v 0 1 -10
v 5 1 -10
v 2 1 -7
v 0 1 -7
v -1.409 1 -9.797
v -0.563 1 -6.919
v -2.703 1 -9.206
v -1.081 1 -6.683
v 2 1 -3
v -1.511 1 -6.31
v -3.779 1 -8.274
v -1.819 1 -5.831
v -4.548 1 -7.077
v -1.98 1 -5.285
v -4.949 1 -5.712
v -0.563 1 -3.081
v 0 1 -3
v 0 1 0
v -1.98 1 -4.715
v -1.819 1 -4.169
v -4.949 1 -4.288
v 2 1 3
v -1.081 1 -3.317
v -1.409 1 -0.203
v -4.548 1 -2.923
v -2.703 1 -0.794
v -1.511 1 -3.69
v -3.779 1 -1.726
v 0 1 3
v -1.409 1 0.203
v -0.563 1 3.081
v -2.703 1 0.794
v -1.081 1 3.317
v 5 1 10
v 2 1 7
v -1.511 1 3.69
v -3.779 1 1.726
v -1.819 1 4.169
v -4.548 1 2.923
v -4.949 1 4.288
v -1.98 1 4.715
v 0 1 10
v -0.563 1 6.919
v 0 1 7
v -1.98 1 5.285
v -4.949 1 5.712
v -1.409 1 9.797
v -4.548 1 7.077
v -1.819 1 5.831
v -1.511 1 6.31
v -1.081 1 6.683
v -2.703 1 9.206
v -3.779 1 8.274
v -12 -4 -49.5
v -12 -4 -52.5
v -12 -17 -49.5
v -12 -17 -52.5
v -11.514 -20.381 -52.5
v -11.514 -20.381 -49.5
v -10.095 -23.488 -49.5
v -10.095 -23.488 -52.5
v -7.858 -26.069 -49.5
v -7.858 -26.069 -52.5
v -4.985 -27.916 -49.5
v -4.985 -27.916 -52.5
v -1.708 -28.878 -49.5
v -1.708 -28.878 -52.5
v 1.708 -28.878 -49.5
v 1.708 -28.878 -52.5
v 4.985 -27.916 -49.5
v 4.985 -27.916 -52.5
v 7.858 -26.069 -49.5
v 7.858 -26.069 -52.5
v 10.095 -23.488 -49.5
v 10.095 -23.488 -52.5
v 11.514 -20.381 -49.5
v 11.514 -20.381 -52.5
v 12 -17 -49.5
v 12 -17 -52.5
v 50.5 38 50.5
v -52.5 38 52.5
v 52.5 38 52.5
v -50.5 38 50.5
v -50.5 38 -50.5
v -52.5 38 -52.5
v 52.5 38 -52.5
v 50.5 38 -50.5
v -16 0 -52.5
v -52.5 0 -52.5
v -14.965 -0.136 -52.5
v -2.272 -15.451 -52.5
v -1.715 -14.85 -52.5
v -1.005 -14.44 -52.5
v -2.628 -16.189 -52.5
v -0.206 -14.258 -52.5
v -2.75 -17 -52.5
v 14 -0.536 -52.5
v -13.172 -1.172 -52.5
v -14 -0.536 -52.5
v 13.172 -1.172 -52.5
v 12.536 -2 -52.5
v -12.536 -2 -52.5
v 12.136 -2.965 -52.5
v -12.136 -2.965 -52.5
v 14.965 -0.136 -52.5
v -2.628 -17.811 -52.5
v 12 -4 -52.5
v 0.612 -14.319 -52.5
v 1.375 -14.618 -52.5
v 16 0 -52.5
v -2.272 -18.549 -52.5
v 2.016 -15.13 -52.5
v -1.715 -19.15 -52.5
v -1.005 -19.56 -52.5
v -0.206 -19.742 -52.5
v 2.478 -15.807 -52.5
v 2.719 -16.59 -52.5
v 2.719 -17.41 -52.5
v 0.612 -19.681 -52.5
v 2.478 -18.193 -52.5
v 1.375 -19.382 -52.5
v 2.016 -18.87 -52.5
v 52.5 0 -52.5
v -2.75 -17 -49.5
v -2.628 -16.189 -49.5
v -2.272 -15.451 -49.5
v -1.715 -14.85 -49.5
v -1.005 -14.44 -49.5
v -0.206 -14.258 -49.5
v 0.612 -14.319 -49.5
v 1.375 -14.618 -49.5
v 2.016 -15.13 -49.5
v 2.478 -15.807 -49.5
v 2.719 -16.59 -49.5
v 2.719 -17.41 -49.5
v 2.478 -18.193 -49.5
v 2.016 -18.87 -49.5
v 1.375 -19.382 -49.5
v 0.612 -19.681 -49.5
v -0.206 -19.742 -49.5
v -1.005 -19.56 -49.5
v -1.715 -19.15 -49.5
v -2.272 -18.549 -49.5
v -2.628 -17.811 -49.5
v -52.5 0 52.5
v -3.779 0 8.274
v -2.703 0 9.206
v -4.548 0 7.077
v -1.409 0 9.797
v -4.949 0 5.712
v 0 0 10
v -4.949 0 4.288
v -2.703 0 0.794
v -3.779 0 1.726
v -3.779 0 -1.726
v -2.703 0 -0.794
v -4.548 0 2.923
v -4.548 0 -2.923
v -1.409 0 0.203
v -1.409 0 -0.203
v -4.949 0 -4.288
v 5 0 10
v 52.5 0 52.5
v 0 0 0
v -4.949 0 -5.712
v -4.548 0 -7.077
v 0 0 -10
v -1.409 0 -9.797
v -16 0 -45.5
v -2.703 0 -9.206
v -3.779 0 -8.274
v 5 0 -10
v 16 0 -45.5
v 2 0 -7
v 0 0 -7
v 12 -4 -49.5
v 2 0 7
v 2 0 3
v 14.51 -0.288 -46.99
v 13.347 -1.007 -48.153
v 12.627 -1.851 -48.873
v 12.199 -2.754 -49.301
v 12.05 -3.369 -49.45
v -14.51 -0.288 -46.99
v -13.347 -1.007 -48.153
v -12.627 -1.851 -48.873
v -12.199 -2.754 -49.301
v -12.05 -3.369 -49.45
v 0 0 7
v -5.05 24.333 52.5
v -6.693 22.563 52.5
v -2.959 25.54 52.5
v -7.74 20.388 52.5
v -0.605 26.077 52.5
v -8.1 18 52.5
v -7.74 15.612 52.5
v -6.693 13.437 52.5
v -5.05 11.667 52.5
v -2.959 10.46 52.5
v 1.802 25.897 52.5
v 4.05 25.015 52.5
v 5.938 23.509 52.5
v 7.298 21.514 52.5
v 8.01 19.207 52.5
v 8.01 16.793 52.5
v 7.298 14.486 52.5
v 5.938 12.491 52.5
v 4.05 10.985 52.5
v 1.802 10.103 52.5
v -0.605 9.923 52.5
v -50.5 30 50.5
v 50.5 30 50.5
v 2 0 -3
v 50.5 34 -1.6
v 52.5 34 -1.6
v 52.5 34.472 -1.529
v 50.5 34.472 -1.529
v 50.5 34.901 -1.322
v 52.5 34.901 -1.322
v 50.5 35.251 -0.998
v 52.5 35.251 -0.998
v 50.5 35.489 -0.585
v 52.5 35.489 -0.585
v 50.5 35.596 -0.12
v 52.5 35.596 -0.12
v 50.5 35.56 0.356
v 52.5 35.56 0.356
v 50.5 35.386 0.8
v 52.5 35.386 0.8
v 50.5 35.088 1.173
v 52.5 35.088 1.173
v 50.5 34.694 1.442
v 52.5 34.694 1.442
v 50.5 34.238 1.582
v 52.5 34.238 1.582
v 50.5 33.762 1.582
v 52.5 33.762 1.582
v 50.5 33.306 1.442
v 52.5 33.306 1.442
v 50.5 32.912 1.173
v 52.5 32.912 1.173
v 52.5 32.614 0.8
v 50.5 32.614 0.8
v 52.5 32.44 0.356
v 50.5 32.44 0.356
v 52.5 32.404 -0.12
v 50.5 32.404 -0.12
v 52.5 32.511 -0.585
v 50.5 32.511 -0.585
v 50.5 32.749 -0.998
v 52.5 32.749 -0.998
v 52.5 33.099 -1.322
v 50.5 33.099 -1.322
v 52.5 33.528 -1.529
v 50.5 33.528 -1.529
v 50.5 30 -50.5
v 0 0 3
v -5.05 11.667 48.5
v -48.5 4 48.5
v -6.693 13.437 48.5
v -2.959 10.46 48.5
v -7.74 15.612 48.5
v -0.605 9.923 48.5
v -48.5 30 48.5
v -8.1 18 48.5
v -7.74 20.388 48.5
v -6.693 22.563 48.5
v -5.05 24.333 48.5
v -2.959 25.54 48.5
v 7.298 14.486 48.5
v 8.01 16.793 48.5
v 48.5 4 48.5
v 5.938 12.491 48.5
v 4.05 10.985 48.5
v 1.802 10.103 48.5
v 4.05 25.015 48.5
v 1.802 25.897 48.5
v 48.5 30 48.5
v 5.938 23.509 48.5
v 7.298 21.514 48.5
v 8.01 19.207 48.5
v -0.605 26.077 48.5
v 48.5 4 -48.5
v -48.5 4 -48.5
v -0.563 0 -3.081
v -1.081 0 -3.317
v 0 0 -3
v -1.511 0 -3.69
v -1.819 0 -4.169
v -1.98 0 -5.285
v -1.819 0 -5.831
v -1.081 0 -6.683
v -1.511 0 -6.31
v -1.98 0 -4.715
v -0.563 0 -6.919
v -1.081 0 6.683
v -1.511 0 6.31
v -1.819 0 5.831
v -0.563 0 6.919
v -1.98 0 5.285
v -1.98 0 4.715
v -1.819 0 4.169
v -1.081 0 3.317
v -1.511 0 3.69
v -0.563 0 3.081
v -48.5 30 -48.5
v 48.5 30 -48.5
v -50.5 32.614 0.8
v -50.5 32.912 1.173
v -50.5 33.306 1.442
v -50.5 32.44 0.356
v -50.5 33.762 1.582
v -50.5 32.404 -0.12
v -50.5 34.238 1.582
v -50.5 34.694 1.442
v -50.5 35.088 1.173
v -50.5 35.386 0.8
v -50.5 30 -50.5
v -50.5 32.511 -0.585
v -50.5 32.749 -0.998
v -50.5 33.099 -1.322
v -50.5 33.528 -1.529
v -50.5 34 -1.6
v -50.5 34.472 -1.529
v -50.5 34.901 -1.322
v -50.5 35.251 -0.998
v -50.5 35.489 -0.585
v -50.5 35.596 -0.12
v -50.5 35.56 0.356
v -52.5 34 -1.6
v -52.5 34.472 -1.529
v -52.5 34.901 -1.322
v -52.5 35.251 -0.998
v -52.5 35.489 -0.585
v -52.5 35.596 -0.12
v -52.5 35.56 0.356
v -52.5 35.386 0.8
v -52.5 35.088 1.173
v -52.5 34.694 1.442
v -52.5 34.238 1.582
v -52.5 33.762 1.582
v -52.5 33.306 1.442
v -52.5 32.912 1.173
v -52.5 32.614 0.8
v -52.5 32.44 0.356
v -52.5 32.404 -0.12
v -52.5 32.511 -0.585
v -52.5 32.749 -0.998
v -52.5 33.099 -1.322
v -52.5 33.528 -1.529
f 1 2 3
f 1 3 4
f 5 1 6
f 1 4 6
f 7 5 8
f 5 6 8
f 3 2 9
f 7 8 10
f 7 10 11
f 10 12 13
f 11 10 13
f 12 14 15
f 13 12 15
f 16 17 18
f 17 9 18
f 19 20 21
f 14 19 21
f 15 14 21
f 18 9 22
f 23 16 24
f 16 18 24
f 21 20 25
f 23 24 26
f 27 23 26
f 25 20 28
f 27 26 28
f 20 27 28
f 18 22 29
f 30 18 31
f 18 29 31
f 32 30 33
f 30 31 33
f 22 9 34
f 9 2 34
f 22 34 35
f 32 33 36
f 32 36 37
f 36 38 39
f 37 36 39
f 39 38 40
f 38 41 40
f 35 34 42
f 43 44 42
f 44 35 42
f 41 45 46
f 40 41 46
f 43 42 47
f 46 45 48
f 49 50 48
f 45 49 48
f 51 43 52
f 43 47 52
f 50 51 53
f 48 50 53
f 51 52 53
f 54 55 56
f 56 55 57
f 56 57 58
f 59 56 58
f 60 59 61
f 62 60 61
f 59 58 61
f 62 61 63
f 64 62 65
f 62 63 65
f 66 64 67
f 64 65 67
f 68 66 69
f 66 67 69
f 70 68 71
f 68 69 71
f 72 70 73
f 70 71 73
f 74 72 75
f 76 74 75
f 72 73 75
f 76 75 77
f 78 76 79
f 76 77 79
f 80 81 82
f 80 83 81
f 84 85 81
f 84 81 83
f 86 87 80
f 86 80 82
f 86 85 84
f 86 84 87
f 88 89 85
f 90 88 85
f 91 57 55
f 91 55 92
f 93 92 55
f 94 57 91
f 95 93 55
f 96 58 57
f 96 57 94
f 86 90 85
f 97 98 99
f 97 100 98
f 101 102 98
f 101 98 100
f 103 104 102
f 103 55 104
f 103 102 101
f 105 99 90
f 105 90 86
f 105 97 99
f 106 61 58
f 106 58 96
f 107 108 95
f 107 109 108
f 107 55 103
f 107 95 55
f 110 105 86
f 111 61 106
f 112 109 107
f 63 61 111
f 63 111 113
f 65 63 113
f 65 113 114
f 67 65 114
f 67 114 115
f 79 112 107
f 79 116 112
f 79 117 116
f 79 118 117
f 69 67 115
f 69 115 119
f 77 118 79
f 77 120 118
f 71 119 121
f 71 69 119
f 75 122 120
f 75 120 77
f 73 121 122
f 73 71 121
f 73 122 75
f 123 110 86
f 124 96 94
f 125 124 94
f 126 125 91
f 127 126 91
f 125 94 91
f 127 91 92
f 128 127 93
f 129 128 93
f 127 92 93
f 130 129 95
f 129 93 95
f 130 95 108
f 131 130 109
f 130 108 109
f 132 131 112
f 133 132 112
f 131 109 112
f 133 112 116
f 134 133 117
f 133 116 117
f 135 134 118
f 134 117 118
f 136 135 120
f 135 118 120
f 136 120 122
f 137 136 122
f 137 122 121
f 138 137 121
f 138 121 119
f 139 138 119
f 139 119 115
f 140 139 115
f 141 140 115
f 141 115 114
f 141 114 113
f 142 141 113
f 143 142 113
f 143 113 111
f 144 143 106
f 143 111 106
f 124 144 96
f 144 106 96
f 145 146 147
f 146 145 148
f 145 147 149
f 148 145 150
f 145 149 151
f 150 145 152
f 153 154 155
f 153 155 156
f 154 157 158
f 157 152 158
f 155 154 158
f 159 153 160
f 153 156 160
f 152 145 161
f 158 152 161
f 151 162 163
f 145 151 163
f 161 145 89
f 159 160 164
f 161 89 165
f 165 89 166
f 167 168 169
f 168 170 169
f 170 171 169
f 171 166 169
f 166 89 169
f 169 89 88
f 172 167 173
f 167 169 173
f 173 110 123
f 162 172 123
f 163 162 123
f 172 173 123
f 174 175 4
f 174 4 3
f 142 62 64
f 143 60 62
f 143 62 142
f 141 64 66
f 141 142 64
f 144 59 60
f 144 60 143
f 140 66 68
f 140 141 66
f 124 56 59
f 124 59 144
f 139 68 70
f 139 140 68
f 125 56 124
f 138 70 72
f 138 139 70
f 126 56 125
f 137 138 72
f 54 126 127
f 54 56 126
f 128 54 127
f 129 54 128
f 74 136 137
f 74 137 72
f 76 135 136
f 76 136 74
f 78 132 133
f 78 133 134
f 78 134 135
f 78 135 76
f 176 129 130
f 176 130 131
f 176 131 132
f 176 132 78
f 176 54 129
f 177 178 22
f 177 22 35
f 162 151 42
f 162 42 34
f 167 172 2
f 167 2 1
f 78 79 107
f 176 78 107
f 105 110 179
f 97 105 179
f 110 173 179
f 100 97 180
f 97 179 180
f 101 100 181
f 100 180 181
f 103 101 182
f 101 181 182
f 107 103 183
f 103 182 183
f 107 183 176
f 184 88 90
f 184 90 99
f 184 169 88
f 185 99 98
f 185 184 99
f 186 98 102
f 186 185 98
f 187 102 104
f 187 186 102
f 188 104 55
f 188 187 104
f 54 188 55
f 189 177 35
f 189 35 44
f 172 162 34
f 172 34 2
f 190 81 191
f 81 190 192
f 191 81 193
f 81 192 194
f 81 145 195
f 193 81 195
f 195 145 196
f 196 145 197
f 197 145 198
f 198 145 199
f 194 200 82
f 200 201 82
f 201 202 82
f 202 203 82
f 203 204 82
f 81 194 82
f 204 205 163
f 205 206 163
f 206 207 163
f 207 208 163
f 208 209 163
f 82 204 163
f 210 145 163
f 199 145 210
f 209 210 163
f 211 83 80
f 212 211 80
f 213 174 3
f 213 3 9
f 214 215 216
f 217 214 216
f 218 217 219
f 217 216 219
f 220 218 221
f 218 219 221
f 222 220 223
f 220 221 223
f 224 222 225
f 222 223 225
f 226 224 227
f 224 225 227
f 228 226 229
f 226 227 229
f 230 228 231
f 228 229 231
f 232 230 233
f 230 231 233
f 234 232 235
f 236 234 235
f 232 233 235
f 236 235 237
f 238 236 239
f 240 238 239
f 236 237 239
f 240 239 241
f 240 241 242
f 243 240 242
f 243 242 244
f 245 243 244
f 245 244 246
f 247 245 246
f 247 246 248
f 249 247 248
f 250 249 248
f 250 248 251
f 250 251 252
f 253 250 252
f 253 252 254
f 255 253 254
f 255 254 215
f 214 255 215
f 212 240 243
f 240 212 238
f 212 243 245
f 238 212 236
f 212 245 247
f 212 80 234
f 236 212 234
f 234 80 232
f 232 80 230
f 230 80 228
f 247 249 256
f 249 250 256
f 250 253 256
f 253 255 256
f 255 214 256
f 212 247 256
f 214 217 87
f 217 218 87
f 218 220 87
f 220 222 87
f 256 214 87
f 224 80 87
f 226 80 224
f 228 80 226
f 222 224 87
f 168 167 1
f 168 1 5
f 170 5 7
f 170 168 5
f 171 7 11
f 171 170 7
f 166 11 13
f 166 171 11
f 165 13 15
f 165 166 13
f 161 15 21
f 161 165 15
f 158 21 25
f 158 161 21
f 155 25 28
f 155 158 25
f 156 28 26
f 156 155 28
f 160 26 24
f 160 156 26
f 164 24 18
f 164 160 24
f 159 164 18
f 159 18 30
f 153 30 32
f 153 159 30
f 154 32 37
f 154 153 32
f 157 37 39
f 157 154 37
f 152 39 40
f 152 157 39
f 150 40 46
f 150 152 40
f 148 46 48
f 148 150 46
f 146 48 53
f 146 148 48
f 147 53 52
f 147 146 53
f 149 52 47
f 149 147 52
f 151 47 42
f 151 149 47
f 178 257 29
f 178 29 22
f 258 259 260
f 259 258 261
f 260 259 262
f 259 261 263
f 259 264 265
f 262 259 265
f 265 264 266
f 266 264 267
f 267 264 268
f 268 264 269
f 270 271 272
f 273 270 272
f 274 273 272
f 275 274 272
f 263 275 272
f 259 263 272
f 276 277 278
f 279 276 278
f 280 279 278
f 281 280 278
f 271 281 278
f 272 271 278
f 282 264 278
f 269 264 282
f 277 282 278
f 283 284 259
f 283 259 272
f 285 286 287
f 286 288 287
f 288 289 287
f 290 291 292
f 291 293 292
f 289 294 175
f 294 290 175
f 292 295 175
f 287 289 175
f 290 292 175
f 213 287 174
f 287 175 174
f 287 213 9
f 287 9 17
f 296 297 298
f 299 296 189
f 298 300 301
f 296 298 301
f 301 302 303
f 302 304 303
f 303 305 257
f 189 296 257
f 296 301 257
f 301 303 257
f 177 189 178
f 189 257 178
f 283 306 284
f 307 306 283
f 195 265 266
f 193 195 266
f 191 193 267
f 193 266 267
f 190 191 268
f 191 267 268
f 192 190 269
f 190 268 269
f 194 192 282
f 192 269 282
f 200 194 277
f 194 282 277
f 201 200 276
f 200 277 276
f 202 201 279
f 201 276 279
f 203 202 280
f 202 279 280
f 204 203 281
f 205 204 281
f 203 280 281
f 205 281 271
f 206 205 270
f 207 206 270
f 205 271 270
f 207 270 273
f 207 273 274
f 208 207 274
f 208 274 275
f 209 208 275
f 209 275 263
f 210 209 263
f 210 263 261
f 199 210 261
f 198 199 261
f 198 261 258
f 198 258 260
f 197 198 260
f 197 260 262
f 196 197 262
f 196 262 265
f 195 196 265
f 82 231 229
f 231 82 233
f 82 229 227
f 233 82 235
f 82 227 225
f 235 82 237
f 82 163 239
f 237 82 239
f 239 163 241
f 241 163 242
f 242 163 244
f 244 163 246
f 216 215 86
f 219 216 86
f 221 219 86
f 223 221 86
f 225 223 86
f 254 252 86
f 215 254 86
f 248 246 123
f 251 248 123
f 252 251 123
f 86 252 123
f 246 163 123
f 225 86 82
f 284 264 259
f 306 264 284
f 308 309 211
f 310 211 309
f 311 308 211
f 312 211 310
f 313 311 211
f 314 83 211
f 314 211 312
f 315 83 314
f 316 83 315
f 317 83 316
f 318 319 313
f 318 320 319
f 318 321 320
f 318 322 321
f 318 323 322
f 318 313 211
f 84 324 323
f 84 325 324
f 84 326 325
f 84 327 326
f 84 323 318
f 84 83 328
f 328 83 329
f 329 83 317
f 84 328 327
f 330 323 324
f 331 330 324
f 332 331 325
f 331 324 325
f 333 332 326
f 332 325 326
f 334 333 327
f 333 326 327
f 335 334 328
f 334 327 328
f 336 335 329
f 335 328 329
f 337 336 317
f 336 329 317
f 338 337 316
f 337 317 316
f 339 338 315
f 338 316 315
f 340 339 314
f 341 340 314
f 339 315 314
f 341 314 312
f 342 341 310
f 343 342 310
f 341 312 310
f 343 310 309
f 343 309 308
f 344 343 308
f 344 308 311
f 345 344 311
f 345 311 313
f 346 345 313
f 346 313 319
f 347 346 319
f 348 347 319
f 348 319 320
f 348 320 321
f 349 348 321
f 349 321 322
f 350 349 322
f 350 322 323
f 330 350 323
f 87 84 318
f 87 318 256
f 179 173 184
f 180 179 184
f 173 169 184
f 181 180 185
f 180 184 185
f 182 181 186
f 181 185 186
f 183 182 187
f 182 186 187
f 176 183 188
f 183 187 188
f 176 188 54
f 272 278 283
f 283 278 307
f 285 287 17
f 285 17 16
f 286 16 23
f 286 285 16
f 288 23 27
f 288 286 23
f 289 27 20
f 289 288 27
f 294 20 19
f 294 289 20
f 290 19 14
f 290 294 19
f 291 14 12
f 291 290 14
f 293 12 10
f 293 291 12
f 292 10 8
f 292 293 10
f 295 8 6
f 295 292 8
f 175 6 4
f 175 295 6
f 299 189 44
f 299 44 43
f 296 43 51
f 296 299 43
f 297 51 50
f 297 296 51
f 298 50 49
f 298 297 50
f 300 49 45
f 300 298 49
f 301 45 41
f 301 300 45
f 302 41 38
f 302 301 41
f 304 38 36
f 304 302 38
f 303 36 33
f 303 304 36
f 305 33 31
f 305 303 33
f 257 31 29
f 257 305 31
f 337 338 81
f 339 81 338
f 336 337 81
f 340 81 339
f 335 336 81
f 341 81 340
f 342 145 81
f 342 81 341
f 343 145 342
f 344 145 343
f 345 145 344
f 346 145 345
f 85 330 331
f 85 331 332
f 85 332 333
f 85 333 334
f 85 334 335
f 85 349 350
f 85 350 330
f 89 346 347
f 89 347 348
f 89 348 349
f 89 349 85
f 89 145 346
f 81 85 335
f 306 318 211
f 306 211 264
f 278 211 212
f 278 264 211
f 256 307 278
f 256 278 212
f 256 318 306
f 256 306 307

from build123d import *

# Parameters (mm, degrees)
SKETCH1_W           = 105
SKETCH1_H           = 105
BOSS_EXTRUDE1_DEPTH = 38
SKETCH2_W           = 97
SKETCH2_H           = 97
CUT_EXTRUDE1_DEPTH  = 34
SKETCH3_W           = 101
SKETCH3_H           = 101
CUT_EXTRUDE2_DEPTH  = 8
SKETCH5_R           = 1.6
CUT_EXTRUDE3_DEPTH  = 106
SKETCH6_R           = 2.75
BOSS_EXTRUDE2_DEPTH = 3
FILLET1_R           = 4
CUT_EXTRUDE4_REACH  = 6
SKETCH7_R           = 8.1
CUT_EXTRUDE5_DEPTH  = 1


with BuildPart() as part:
    # Sketch1 → Boss-Extrude1 (new body)
    with BuildSketch(Plane(origin=(0, 0, 0), x_dir=(1, 0, 0), z_dir=(0, 1, 0))):
        Rectangle(SKETCH1_W, SKETCH1_H)
    extrude(amount=BOSS_EXTRUDE1_DEPTH)

    # Sketch2 → Cut-Extrude1 (cut)
    with BuildSketch(Plane(origin=(0, 38, 0), x_dir=(1, 0, 0), z_dir=(0, 1, 0))):
        Rectangle(SKETCH2_W, SKETCH2_H)
    extrude(amount=-CUT_EXTRUDE1_DEPTH, mode=Mode.SUBTRACT)

    # Sketch3 → Cut-Extrude2 (cut)
    with BuildSketch(Plane(origin=(0, 38, 0), x_dir=(1, 0, 0), z_dir=(0, 1, 0))):
        Rectangle(SKETCH3_W, SKETCH3_H)
    extrude(amount=-CUT_EXTRUDE2_DEPTH, mode=Mode.SUBTRACT)

    # Sketch5 → Cut-Extrude3 (cut, through all)
    with BuildSketch(Plane(origin=(52.5, 0, 0), x_dir=(0, 0, -1), z_dir=(1, 0, 0))):
        with Locations((0, 34)):
            Circle(SKETCH5_R)
    extrude(amount=-CUT_EXTRUDE3_DEPTH, mode=Mode.SUBTRACT)

    # Sketch6 → Boss-Extrude2 (add)
    with BuildSketch(Plane(origin=(0, 0, -52.5), x_dir=(-1, 0, 0), z_dir=(0, 0, -1))):
        with BuildLine():
            Line((-12, 0), (12, 0))
            Line((12, 0), (12, -5))
            Line((12, -5), (12, -17))
            ThreePointArc((12, -17), (0, -29), (-12, -17))
            Line((-12, -17), (-12, -5))
            Line((-12, -5), (-12, 0))
        make_face()
        with Locations((0, -17)):
            Circle(SKETCH6_R, mode=Mode.SUBTRACT)
    extrude(amount=-BOSS_EXTRUDE2_DEPTH)

    # Fillet1
    fillet1_edges = [part.edges().sort_by_distance(p)[0] for p in [
        (0, 0, -49.5),
        (12, 0, -51),
        (-12, 0, -51),
    ]]
    fillet(fillet1_edges, radius=FILLET1_R)

    # Sketch7 → Cut-Extrude4 (cut, up to next)
    with BuildSketch(Plane(origin=(0, 0, 48.5), x_dir=(-1, 0, 0), z_dir=(0, 0, -1)), mode=Mode.PRIVATE) as cut_extrude4_sk1:
        with Locations((0, 18)):
            Circle(SKETCH7_R)
    cut_extrude4_tool1 = extrude(cut_extrude4_sk1.sketch, amount=-CUT_EXTRUDE4_REACH, mode=Mode.PRIVATE) & part.part
    add(cut_extrude4_tool1.solids().sort_by_distance((0, 18, 48.5))[0], mode=Mode.SUBTRACT)

    # Sketch10 → Cut-Extrude5 (cut)
    with BuildSketch(Plane.XZ):
        with BuildLine():
            Line((5, -10), (0, -10))
            ThreePointArc((0, -10), (-5, -5), (0, 0))
            ThreePointArc((0, 0), (-5, 5), (0, 10))
            Line((0, 10), (5, 10))
            Line((5, 10), (5, -10))
        make_face()
        with BuildLine():
            Line((0, -7), (2, -7))
            Line((2, -7), (2, -3))
            Line((2, -3), (0, -3))
            ThreePointArc((0, -3), (-2, -5), (0, -7))
        make_face(mode=Mode.SUBTRACT)
        with BuildLine():
            Line((0, 3), (2, 3))
            Line((2, 3), (2, 7))
            Line((2, 7), (0, 7))
            ThreePointArc((0, 7), (-2, 5), (0, 3))
        make_face(mode=Mode.SUBTRACT)
    extrude(amount=-CUT_EXTRUDE5_DEPTH, mode=Mode.SUBTRACT)


solid = part.part
